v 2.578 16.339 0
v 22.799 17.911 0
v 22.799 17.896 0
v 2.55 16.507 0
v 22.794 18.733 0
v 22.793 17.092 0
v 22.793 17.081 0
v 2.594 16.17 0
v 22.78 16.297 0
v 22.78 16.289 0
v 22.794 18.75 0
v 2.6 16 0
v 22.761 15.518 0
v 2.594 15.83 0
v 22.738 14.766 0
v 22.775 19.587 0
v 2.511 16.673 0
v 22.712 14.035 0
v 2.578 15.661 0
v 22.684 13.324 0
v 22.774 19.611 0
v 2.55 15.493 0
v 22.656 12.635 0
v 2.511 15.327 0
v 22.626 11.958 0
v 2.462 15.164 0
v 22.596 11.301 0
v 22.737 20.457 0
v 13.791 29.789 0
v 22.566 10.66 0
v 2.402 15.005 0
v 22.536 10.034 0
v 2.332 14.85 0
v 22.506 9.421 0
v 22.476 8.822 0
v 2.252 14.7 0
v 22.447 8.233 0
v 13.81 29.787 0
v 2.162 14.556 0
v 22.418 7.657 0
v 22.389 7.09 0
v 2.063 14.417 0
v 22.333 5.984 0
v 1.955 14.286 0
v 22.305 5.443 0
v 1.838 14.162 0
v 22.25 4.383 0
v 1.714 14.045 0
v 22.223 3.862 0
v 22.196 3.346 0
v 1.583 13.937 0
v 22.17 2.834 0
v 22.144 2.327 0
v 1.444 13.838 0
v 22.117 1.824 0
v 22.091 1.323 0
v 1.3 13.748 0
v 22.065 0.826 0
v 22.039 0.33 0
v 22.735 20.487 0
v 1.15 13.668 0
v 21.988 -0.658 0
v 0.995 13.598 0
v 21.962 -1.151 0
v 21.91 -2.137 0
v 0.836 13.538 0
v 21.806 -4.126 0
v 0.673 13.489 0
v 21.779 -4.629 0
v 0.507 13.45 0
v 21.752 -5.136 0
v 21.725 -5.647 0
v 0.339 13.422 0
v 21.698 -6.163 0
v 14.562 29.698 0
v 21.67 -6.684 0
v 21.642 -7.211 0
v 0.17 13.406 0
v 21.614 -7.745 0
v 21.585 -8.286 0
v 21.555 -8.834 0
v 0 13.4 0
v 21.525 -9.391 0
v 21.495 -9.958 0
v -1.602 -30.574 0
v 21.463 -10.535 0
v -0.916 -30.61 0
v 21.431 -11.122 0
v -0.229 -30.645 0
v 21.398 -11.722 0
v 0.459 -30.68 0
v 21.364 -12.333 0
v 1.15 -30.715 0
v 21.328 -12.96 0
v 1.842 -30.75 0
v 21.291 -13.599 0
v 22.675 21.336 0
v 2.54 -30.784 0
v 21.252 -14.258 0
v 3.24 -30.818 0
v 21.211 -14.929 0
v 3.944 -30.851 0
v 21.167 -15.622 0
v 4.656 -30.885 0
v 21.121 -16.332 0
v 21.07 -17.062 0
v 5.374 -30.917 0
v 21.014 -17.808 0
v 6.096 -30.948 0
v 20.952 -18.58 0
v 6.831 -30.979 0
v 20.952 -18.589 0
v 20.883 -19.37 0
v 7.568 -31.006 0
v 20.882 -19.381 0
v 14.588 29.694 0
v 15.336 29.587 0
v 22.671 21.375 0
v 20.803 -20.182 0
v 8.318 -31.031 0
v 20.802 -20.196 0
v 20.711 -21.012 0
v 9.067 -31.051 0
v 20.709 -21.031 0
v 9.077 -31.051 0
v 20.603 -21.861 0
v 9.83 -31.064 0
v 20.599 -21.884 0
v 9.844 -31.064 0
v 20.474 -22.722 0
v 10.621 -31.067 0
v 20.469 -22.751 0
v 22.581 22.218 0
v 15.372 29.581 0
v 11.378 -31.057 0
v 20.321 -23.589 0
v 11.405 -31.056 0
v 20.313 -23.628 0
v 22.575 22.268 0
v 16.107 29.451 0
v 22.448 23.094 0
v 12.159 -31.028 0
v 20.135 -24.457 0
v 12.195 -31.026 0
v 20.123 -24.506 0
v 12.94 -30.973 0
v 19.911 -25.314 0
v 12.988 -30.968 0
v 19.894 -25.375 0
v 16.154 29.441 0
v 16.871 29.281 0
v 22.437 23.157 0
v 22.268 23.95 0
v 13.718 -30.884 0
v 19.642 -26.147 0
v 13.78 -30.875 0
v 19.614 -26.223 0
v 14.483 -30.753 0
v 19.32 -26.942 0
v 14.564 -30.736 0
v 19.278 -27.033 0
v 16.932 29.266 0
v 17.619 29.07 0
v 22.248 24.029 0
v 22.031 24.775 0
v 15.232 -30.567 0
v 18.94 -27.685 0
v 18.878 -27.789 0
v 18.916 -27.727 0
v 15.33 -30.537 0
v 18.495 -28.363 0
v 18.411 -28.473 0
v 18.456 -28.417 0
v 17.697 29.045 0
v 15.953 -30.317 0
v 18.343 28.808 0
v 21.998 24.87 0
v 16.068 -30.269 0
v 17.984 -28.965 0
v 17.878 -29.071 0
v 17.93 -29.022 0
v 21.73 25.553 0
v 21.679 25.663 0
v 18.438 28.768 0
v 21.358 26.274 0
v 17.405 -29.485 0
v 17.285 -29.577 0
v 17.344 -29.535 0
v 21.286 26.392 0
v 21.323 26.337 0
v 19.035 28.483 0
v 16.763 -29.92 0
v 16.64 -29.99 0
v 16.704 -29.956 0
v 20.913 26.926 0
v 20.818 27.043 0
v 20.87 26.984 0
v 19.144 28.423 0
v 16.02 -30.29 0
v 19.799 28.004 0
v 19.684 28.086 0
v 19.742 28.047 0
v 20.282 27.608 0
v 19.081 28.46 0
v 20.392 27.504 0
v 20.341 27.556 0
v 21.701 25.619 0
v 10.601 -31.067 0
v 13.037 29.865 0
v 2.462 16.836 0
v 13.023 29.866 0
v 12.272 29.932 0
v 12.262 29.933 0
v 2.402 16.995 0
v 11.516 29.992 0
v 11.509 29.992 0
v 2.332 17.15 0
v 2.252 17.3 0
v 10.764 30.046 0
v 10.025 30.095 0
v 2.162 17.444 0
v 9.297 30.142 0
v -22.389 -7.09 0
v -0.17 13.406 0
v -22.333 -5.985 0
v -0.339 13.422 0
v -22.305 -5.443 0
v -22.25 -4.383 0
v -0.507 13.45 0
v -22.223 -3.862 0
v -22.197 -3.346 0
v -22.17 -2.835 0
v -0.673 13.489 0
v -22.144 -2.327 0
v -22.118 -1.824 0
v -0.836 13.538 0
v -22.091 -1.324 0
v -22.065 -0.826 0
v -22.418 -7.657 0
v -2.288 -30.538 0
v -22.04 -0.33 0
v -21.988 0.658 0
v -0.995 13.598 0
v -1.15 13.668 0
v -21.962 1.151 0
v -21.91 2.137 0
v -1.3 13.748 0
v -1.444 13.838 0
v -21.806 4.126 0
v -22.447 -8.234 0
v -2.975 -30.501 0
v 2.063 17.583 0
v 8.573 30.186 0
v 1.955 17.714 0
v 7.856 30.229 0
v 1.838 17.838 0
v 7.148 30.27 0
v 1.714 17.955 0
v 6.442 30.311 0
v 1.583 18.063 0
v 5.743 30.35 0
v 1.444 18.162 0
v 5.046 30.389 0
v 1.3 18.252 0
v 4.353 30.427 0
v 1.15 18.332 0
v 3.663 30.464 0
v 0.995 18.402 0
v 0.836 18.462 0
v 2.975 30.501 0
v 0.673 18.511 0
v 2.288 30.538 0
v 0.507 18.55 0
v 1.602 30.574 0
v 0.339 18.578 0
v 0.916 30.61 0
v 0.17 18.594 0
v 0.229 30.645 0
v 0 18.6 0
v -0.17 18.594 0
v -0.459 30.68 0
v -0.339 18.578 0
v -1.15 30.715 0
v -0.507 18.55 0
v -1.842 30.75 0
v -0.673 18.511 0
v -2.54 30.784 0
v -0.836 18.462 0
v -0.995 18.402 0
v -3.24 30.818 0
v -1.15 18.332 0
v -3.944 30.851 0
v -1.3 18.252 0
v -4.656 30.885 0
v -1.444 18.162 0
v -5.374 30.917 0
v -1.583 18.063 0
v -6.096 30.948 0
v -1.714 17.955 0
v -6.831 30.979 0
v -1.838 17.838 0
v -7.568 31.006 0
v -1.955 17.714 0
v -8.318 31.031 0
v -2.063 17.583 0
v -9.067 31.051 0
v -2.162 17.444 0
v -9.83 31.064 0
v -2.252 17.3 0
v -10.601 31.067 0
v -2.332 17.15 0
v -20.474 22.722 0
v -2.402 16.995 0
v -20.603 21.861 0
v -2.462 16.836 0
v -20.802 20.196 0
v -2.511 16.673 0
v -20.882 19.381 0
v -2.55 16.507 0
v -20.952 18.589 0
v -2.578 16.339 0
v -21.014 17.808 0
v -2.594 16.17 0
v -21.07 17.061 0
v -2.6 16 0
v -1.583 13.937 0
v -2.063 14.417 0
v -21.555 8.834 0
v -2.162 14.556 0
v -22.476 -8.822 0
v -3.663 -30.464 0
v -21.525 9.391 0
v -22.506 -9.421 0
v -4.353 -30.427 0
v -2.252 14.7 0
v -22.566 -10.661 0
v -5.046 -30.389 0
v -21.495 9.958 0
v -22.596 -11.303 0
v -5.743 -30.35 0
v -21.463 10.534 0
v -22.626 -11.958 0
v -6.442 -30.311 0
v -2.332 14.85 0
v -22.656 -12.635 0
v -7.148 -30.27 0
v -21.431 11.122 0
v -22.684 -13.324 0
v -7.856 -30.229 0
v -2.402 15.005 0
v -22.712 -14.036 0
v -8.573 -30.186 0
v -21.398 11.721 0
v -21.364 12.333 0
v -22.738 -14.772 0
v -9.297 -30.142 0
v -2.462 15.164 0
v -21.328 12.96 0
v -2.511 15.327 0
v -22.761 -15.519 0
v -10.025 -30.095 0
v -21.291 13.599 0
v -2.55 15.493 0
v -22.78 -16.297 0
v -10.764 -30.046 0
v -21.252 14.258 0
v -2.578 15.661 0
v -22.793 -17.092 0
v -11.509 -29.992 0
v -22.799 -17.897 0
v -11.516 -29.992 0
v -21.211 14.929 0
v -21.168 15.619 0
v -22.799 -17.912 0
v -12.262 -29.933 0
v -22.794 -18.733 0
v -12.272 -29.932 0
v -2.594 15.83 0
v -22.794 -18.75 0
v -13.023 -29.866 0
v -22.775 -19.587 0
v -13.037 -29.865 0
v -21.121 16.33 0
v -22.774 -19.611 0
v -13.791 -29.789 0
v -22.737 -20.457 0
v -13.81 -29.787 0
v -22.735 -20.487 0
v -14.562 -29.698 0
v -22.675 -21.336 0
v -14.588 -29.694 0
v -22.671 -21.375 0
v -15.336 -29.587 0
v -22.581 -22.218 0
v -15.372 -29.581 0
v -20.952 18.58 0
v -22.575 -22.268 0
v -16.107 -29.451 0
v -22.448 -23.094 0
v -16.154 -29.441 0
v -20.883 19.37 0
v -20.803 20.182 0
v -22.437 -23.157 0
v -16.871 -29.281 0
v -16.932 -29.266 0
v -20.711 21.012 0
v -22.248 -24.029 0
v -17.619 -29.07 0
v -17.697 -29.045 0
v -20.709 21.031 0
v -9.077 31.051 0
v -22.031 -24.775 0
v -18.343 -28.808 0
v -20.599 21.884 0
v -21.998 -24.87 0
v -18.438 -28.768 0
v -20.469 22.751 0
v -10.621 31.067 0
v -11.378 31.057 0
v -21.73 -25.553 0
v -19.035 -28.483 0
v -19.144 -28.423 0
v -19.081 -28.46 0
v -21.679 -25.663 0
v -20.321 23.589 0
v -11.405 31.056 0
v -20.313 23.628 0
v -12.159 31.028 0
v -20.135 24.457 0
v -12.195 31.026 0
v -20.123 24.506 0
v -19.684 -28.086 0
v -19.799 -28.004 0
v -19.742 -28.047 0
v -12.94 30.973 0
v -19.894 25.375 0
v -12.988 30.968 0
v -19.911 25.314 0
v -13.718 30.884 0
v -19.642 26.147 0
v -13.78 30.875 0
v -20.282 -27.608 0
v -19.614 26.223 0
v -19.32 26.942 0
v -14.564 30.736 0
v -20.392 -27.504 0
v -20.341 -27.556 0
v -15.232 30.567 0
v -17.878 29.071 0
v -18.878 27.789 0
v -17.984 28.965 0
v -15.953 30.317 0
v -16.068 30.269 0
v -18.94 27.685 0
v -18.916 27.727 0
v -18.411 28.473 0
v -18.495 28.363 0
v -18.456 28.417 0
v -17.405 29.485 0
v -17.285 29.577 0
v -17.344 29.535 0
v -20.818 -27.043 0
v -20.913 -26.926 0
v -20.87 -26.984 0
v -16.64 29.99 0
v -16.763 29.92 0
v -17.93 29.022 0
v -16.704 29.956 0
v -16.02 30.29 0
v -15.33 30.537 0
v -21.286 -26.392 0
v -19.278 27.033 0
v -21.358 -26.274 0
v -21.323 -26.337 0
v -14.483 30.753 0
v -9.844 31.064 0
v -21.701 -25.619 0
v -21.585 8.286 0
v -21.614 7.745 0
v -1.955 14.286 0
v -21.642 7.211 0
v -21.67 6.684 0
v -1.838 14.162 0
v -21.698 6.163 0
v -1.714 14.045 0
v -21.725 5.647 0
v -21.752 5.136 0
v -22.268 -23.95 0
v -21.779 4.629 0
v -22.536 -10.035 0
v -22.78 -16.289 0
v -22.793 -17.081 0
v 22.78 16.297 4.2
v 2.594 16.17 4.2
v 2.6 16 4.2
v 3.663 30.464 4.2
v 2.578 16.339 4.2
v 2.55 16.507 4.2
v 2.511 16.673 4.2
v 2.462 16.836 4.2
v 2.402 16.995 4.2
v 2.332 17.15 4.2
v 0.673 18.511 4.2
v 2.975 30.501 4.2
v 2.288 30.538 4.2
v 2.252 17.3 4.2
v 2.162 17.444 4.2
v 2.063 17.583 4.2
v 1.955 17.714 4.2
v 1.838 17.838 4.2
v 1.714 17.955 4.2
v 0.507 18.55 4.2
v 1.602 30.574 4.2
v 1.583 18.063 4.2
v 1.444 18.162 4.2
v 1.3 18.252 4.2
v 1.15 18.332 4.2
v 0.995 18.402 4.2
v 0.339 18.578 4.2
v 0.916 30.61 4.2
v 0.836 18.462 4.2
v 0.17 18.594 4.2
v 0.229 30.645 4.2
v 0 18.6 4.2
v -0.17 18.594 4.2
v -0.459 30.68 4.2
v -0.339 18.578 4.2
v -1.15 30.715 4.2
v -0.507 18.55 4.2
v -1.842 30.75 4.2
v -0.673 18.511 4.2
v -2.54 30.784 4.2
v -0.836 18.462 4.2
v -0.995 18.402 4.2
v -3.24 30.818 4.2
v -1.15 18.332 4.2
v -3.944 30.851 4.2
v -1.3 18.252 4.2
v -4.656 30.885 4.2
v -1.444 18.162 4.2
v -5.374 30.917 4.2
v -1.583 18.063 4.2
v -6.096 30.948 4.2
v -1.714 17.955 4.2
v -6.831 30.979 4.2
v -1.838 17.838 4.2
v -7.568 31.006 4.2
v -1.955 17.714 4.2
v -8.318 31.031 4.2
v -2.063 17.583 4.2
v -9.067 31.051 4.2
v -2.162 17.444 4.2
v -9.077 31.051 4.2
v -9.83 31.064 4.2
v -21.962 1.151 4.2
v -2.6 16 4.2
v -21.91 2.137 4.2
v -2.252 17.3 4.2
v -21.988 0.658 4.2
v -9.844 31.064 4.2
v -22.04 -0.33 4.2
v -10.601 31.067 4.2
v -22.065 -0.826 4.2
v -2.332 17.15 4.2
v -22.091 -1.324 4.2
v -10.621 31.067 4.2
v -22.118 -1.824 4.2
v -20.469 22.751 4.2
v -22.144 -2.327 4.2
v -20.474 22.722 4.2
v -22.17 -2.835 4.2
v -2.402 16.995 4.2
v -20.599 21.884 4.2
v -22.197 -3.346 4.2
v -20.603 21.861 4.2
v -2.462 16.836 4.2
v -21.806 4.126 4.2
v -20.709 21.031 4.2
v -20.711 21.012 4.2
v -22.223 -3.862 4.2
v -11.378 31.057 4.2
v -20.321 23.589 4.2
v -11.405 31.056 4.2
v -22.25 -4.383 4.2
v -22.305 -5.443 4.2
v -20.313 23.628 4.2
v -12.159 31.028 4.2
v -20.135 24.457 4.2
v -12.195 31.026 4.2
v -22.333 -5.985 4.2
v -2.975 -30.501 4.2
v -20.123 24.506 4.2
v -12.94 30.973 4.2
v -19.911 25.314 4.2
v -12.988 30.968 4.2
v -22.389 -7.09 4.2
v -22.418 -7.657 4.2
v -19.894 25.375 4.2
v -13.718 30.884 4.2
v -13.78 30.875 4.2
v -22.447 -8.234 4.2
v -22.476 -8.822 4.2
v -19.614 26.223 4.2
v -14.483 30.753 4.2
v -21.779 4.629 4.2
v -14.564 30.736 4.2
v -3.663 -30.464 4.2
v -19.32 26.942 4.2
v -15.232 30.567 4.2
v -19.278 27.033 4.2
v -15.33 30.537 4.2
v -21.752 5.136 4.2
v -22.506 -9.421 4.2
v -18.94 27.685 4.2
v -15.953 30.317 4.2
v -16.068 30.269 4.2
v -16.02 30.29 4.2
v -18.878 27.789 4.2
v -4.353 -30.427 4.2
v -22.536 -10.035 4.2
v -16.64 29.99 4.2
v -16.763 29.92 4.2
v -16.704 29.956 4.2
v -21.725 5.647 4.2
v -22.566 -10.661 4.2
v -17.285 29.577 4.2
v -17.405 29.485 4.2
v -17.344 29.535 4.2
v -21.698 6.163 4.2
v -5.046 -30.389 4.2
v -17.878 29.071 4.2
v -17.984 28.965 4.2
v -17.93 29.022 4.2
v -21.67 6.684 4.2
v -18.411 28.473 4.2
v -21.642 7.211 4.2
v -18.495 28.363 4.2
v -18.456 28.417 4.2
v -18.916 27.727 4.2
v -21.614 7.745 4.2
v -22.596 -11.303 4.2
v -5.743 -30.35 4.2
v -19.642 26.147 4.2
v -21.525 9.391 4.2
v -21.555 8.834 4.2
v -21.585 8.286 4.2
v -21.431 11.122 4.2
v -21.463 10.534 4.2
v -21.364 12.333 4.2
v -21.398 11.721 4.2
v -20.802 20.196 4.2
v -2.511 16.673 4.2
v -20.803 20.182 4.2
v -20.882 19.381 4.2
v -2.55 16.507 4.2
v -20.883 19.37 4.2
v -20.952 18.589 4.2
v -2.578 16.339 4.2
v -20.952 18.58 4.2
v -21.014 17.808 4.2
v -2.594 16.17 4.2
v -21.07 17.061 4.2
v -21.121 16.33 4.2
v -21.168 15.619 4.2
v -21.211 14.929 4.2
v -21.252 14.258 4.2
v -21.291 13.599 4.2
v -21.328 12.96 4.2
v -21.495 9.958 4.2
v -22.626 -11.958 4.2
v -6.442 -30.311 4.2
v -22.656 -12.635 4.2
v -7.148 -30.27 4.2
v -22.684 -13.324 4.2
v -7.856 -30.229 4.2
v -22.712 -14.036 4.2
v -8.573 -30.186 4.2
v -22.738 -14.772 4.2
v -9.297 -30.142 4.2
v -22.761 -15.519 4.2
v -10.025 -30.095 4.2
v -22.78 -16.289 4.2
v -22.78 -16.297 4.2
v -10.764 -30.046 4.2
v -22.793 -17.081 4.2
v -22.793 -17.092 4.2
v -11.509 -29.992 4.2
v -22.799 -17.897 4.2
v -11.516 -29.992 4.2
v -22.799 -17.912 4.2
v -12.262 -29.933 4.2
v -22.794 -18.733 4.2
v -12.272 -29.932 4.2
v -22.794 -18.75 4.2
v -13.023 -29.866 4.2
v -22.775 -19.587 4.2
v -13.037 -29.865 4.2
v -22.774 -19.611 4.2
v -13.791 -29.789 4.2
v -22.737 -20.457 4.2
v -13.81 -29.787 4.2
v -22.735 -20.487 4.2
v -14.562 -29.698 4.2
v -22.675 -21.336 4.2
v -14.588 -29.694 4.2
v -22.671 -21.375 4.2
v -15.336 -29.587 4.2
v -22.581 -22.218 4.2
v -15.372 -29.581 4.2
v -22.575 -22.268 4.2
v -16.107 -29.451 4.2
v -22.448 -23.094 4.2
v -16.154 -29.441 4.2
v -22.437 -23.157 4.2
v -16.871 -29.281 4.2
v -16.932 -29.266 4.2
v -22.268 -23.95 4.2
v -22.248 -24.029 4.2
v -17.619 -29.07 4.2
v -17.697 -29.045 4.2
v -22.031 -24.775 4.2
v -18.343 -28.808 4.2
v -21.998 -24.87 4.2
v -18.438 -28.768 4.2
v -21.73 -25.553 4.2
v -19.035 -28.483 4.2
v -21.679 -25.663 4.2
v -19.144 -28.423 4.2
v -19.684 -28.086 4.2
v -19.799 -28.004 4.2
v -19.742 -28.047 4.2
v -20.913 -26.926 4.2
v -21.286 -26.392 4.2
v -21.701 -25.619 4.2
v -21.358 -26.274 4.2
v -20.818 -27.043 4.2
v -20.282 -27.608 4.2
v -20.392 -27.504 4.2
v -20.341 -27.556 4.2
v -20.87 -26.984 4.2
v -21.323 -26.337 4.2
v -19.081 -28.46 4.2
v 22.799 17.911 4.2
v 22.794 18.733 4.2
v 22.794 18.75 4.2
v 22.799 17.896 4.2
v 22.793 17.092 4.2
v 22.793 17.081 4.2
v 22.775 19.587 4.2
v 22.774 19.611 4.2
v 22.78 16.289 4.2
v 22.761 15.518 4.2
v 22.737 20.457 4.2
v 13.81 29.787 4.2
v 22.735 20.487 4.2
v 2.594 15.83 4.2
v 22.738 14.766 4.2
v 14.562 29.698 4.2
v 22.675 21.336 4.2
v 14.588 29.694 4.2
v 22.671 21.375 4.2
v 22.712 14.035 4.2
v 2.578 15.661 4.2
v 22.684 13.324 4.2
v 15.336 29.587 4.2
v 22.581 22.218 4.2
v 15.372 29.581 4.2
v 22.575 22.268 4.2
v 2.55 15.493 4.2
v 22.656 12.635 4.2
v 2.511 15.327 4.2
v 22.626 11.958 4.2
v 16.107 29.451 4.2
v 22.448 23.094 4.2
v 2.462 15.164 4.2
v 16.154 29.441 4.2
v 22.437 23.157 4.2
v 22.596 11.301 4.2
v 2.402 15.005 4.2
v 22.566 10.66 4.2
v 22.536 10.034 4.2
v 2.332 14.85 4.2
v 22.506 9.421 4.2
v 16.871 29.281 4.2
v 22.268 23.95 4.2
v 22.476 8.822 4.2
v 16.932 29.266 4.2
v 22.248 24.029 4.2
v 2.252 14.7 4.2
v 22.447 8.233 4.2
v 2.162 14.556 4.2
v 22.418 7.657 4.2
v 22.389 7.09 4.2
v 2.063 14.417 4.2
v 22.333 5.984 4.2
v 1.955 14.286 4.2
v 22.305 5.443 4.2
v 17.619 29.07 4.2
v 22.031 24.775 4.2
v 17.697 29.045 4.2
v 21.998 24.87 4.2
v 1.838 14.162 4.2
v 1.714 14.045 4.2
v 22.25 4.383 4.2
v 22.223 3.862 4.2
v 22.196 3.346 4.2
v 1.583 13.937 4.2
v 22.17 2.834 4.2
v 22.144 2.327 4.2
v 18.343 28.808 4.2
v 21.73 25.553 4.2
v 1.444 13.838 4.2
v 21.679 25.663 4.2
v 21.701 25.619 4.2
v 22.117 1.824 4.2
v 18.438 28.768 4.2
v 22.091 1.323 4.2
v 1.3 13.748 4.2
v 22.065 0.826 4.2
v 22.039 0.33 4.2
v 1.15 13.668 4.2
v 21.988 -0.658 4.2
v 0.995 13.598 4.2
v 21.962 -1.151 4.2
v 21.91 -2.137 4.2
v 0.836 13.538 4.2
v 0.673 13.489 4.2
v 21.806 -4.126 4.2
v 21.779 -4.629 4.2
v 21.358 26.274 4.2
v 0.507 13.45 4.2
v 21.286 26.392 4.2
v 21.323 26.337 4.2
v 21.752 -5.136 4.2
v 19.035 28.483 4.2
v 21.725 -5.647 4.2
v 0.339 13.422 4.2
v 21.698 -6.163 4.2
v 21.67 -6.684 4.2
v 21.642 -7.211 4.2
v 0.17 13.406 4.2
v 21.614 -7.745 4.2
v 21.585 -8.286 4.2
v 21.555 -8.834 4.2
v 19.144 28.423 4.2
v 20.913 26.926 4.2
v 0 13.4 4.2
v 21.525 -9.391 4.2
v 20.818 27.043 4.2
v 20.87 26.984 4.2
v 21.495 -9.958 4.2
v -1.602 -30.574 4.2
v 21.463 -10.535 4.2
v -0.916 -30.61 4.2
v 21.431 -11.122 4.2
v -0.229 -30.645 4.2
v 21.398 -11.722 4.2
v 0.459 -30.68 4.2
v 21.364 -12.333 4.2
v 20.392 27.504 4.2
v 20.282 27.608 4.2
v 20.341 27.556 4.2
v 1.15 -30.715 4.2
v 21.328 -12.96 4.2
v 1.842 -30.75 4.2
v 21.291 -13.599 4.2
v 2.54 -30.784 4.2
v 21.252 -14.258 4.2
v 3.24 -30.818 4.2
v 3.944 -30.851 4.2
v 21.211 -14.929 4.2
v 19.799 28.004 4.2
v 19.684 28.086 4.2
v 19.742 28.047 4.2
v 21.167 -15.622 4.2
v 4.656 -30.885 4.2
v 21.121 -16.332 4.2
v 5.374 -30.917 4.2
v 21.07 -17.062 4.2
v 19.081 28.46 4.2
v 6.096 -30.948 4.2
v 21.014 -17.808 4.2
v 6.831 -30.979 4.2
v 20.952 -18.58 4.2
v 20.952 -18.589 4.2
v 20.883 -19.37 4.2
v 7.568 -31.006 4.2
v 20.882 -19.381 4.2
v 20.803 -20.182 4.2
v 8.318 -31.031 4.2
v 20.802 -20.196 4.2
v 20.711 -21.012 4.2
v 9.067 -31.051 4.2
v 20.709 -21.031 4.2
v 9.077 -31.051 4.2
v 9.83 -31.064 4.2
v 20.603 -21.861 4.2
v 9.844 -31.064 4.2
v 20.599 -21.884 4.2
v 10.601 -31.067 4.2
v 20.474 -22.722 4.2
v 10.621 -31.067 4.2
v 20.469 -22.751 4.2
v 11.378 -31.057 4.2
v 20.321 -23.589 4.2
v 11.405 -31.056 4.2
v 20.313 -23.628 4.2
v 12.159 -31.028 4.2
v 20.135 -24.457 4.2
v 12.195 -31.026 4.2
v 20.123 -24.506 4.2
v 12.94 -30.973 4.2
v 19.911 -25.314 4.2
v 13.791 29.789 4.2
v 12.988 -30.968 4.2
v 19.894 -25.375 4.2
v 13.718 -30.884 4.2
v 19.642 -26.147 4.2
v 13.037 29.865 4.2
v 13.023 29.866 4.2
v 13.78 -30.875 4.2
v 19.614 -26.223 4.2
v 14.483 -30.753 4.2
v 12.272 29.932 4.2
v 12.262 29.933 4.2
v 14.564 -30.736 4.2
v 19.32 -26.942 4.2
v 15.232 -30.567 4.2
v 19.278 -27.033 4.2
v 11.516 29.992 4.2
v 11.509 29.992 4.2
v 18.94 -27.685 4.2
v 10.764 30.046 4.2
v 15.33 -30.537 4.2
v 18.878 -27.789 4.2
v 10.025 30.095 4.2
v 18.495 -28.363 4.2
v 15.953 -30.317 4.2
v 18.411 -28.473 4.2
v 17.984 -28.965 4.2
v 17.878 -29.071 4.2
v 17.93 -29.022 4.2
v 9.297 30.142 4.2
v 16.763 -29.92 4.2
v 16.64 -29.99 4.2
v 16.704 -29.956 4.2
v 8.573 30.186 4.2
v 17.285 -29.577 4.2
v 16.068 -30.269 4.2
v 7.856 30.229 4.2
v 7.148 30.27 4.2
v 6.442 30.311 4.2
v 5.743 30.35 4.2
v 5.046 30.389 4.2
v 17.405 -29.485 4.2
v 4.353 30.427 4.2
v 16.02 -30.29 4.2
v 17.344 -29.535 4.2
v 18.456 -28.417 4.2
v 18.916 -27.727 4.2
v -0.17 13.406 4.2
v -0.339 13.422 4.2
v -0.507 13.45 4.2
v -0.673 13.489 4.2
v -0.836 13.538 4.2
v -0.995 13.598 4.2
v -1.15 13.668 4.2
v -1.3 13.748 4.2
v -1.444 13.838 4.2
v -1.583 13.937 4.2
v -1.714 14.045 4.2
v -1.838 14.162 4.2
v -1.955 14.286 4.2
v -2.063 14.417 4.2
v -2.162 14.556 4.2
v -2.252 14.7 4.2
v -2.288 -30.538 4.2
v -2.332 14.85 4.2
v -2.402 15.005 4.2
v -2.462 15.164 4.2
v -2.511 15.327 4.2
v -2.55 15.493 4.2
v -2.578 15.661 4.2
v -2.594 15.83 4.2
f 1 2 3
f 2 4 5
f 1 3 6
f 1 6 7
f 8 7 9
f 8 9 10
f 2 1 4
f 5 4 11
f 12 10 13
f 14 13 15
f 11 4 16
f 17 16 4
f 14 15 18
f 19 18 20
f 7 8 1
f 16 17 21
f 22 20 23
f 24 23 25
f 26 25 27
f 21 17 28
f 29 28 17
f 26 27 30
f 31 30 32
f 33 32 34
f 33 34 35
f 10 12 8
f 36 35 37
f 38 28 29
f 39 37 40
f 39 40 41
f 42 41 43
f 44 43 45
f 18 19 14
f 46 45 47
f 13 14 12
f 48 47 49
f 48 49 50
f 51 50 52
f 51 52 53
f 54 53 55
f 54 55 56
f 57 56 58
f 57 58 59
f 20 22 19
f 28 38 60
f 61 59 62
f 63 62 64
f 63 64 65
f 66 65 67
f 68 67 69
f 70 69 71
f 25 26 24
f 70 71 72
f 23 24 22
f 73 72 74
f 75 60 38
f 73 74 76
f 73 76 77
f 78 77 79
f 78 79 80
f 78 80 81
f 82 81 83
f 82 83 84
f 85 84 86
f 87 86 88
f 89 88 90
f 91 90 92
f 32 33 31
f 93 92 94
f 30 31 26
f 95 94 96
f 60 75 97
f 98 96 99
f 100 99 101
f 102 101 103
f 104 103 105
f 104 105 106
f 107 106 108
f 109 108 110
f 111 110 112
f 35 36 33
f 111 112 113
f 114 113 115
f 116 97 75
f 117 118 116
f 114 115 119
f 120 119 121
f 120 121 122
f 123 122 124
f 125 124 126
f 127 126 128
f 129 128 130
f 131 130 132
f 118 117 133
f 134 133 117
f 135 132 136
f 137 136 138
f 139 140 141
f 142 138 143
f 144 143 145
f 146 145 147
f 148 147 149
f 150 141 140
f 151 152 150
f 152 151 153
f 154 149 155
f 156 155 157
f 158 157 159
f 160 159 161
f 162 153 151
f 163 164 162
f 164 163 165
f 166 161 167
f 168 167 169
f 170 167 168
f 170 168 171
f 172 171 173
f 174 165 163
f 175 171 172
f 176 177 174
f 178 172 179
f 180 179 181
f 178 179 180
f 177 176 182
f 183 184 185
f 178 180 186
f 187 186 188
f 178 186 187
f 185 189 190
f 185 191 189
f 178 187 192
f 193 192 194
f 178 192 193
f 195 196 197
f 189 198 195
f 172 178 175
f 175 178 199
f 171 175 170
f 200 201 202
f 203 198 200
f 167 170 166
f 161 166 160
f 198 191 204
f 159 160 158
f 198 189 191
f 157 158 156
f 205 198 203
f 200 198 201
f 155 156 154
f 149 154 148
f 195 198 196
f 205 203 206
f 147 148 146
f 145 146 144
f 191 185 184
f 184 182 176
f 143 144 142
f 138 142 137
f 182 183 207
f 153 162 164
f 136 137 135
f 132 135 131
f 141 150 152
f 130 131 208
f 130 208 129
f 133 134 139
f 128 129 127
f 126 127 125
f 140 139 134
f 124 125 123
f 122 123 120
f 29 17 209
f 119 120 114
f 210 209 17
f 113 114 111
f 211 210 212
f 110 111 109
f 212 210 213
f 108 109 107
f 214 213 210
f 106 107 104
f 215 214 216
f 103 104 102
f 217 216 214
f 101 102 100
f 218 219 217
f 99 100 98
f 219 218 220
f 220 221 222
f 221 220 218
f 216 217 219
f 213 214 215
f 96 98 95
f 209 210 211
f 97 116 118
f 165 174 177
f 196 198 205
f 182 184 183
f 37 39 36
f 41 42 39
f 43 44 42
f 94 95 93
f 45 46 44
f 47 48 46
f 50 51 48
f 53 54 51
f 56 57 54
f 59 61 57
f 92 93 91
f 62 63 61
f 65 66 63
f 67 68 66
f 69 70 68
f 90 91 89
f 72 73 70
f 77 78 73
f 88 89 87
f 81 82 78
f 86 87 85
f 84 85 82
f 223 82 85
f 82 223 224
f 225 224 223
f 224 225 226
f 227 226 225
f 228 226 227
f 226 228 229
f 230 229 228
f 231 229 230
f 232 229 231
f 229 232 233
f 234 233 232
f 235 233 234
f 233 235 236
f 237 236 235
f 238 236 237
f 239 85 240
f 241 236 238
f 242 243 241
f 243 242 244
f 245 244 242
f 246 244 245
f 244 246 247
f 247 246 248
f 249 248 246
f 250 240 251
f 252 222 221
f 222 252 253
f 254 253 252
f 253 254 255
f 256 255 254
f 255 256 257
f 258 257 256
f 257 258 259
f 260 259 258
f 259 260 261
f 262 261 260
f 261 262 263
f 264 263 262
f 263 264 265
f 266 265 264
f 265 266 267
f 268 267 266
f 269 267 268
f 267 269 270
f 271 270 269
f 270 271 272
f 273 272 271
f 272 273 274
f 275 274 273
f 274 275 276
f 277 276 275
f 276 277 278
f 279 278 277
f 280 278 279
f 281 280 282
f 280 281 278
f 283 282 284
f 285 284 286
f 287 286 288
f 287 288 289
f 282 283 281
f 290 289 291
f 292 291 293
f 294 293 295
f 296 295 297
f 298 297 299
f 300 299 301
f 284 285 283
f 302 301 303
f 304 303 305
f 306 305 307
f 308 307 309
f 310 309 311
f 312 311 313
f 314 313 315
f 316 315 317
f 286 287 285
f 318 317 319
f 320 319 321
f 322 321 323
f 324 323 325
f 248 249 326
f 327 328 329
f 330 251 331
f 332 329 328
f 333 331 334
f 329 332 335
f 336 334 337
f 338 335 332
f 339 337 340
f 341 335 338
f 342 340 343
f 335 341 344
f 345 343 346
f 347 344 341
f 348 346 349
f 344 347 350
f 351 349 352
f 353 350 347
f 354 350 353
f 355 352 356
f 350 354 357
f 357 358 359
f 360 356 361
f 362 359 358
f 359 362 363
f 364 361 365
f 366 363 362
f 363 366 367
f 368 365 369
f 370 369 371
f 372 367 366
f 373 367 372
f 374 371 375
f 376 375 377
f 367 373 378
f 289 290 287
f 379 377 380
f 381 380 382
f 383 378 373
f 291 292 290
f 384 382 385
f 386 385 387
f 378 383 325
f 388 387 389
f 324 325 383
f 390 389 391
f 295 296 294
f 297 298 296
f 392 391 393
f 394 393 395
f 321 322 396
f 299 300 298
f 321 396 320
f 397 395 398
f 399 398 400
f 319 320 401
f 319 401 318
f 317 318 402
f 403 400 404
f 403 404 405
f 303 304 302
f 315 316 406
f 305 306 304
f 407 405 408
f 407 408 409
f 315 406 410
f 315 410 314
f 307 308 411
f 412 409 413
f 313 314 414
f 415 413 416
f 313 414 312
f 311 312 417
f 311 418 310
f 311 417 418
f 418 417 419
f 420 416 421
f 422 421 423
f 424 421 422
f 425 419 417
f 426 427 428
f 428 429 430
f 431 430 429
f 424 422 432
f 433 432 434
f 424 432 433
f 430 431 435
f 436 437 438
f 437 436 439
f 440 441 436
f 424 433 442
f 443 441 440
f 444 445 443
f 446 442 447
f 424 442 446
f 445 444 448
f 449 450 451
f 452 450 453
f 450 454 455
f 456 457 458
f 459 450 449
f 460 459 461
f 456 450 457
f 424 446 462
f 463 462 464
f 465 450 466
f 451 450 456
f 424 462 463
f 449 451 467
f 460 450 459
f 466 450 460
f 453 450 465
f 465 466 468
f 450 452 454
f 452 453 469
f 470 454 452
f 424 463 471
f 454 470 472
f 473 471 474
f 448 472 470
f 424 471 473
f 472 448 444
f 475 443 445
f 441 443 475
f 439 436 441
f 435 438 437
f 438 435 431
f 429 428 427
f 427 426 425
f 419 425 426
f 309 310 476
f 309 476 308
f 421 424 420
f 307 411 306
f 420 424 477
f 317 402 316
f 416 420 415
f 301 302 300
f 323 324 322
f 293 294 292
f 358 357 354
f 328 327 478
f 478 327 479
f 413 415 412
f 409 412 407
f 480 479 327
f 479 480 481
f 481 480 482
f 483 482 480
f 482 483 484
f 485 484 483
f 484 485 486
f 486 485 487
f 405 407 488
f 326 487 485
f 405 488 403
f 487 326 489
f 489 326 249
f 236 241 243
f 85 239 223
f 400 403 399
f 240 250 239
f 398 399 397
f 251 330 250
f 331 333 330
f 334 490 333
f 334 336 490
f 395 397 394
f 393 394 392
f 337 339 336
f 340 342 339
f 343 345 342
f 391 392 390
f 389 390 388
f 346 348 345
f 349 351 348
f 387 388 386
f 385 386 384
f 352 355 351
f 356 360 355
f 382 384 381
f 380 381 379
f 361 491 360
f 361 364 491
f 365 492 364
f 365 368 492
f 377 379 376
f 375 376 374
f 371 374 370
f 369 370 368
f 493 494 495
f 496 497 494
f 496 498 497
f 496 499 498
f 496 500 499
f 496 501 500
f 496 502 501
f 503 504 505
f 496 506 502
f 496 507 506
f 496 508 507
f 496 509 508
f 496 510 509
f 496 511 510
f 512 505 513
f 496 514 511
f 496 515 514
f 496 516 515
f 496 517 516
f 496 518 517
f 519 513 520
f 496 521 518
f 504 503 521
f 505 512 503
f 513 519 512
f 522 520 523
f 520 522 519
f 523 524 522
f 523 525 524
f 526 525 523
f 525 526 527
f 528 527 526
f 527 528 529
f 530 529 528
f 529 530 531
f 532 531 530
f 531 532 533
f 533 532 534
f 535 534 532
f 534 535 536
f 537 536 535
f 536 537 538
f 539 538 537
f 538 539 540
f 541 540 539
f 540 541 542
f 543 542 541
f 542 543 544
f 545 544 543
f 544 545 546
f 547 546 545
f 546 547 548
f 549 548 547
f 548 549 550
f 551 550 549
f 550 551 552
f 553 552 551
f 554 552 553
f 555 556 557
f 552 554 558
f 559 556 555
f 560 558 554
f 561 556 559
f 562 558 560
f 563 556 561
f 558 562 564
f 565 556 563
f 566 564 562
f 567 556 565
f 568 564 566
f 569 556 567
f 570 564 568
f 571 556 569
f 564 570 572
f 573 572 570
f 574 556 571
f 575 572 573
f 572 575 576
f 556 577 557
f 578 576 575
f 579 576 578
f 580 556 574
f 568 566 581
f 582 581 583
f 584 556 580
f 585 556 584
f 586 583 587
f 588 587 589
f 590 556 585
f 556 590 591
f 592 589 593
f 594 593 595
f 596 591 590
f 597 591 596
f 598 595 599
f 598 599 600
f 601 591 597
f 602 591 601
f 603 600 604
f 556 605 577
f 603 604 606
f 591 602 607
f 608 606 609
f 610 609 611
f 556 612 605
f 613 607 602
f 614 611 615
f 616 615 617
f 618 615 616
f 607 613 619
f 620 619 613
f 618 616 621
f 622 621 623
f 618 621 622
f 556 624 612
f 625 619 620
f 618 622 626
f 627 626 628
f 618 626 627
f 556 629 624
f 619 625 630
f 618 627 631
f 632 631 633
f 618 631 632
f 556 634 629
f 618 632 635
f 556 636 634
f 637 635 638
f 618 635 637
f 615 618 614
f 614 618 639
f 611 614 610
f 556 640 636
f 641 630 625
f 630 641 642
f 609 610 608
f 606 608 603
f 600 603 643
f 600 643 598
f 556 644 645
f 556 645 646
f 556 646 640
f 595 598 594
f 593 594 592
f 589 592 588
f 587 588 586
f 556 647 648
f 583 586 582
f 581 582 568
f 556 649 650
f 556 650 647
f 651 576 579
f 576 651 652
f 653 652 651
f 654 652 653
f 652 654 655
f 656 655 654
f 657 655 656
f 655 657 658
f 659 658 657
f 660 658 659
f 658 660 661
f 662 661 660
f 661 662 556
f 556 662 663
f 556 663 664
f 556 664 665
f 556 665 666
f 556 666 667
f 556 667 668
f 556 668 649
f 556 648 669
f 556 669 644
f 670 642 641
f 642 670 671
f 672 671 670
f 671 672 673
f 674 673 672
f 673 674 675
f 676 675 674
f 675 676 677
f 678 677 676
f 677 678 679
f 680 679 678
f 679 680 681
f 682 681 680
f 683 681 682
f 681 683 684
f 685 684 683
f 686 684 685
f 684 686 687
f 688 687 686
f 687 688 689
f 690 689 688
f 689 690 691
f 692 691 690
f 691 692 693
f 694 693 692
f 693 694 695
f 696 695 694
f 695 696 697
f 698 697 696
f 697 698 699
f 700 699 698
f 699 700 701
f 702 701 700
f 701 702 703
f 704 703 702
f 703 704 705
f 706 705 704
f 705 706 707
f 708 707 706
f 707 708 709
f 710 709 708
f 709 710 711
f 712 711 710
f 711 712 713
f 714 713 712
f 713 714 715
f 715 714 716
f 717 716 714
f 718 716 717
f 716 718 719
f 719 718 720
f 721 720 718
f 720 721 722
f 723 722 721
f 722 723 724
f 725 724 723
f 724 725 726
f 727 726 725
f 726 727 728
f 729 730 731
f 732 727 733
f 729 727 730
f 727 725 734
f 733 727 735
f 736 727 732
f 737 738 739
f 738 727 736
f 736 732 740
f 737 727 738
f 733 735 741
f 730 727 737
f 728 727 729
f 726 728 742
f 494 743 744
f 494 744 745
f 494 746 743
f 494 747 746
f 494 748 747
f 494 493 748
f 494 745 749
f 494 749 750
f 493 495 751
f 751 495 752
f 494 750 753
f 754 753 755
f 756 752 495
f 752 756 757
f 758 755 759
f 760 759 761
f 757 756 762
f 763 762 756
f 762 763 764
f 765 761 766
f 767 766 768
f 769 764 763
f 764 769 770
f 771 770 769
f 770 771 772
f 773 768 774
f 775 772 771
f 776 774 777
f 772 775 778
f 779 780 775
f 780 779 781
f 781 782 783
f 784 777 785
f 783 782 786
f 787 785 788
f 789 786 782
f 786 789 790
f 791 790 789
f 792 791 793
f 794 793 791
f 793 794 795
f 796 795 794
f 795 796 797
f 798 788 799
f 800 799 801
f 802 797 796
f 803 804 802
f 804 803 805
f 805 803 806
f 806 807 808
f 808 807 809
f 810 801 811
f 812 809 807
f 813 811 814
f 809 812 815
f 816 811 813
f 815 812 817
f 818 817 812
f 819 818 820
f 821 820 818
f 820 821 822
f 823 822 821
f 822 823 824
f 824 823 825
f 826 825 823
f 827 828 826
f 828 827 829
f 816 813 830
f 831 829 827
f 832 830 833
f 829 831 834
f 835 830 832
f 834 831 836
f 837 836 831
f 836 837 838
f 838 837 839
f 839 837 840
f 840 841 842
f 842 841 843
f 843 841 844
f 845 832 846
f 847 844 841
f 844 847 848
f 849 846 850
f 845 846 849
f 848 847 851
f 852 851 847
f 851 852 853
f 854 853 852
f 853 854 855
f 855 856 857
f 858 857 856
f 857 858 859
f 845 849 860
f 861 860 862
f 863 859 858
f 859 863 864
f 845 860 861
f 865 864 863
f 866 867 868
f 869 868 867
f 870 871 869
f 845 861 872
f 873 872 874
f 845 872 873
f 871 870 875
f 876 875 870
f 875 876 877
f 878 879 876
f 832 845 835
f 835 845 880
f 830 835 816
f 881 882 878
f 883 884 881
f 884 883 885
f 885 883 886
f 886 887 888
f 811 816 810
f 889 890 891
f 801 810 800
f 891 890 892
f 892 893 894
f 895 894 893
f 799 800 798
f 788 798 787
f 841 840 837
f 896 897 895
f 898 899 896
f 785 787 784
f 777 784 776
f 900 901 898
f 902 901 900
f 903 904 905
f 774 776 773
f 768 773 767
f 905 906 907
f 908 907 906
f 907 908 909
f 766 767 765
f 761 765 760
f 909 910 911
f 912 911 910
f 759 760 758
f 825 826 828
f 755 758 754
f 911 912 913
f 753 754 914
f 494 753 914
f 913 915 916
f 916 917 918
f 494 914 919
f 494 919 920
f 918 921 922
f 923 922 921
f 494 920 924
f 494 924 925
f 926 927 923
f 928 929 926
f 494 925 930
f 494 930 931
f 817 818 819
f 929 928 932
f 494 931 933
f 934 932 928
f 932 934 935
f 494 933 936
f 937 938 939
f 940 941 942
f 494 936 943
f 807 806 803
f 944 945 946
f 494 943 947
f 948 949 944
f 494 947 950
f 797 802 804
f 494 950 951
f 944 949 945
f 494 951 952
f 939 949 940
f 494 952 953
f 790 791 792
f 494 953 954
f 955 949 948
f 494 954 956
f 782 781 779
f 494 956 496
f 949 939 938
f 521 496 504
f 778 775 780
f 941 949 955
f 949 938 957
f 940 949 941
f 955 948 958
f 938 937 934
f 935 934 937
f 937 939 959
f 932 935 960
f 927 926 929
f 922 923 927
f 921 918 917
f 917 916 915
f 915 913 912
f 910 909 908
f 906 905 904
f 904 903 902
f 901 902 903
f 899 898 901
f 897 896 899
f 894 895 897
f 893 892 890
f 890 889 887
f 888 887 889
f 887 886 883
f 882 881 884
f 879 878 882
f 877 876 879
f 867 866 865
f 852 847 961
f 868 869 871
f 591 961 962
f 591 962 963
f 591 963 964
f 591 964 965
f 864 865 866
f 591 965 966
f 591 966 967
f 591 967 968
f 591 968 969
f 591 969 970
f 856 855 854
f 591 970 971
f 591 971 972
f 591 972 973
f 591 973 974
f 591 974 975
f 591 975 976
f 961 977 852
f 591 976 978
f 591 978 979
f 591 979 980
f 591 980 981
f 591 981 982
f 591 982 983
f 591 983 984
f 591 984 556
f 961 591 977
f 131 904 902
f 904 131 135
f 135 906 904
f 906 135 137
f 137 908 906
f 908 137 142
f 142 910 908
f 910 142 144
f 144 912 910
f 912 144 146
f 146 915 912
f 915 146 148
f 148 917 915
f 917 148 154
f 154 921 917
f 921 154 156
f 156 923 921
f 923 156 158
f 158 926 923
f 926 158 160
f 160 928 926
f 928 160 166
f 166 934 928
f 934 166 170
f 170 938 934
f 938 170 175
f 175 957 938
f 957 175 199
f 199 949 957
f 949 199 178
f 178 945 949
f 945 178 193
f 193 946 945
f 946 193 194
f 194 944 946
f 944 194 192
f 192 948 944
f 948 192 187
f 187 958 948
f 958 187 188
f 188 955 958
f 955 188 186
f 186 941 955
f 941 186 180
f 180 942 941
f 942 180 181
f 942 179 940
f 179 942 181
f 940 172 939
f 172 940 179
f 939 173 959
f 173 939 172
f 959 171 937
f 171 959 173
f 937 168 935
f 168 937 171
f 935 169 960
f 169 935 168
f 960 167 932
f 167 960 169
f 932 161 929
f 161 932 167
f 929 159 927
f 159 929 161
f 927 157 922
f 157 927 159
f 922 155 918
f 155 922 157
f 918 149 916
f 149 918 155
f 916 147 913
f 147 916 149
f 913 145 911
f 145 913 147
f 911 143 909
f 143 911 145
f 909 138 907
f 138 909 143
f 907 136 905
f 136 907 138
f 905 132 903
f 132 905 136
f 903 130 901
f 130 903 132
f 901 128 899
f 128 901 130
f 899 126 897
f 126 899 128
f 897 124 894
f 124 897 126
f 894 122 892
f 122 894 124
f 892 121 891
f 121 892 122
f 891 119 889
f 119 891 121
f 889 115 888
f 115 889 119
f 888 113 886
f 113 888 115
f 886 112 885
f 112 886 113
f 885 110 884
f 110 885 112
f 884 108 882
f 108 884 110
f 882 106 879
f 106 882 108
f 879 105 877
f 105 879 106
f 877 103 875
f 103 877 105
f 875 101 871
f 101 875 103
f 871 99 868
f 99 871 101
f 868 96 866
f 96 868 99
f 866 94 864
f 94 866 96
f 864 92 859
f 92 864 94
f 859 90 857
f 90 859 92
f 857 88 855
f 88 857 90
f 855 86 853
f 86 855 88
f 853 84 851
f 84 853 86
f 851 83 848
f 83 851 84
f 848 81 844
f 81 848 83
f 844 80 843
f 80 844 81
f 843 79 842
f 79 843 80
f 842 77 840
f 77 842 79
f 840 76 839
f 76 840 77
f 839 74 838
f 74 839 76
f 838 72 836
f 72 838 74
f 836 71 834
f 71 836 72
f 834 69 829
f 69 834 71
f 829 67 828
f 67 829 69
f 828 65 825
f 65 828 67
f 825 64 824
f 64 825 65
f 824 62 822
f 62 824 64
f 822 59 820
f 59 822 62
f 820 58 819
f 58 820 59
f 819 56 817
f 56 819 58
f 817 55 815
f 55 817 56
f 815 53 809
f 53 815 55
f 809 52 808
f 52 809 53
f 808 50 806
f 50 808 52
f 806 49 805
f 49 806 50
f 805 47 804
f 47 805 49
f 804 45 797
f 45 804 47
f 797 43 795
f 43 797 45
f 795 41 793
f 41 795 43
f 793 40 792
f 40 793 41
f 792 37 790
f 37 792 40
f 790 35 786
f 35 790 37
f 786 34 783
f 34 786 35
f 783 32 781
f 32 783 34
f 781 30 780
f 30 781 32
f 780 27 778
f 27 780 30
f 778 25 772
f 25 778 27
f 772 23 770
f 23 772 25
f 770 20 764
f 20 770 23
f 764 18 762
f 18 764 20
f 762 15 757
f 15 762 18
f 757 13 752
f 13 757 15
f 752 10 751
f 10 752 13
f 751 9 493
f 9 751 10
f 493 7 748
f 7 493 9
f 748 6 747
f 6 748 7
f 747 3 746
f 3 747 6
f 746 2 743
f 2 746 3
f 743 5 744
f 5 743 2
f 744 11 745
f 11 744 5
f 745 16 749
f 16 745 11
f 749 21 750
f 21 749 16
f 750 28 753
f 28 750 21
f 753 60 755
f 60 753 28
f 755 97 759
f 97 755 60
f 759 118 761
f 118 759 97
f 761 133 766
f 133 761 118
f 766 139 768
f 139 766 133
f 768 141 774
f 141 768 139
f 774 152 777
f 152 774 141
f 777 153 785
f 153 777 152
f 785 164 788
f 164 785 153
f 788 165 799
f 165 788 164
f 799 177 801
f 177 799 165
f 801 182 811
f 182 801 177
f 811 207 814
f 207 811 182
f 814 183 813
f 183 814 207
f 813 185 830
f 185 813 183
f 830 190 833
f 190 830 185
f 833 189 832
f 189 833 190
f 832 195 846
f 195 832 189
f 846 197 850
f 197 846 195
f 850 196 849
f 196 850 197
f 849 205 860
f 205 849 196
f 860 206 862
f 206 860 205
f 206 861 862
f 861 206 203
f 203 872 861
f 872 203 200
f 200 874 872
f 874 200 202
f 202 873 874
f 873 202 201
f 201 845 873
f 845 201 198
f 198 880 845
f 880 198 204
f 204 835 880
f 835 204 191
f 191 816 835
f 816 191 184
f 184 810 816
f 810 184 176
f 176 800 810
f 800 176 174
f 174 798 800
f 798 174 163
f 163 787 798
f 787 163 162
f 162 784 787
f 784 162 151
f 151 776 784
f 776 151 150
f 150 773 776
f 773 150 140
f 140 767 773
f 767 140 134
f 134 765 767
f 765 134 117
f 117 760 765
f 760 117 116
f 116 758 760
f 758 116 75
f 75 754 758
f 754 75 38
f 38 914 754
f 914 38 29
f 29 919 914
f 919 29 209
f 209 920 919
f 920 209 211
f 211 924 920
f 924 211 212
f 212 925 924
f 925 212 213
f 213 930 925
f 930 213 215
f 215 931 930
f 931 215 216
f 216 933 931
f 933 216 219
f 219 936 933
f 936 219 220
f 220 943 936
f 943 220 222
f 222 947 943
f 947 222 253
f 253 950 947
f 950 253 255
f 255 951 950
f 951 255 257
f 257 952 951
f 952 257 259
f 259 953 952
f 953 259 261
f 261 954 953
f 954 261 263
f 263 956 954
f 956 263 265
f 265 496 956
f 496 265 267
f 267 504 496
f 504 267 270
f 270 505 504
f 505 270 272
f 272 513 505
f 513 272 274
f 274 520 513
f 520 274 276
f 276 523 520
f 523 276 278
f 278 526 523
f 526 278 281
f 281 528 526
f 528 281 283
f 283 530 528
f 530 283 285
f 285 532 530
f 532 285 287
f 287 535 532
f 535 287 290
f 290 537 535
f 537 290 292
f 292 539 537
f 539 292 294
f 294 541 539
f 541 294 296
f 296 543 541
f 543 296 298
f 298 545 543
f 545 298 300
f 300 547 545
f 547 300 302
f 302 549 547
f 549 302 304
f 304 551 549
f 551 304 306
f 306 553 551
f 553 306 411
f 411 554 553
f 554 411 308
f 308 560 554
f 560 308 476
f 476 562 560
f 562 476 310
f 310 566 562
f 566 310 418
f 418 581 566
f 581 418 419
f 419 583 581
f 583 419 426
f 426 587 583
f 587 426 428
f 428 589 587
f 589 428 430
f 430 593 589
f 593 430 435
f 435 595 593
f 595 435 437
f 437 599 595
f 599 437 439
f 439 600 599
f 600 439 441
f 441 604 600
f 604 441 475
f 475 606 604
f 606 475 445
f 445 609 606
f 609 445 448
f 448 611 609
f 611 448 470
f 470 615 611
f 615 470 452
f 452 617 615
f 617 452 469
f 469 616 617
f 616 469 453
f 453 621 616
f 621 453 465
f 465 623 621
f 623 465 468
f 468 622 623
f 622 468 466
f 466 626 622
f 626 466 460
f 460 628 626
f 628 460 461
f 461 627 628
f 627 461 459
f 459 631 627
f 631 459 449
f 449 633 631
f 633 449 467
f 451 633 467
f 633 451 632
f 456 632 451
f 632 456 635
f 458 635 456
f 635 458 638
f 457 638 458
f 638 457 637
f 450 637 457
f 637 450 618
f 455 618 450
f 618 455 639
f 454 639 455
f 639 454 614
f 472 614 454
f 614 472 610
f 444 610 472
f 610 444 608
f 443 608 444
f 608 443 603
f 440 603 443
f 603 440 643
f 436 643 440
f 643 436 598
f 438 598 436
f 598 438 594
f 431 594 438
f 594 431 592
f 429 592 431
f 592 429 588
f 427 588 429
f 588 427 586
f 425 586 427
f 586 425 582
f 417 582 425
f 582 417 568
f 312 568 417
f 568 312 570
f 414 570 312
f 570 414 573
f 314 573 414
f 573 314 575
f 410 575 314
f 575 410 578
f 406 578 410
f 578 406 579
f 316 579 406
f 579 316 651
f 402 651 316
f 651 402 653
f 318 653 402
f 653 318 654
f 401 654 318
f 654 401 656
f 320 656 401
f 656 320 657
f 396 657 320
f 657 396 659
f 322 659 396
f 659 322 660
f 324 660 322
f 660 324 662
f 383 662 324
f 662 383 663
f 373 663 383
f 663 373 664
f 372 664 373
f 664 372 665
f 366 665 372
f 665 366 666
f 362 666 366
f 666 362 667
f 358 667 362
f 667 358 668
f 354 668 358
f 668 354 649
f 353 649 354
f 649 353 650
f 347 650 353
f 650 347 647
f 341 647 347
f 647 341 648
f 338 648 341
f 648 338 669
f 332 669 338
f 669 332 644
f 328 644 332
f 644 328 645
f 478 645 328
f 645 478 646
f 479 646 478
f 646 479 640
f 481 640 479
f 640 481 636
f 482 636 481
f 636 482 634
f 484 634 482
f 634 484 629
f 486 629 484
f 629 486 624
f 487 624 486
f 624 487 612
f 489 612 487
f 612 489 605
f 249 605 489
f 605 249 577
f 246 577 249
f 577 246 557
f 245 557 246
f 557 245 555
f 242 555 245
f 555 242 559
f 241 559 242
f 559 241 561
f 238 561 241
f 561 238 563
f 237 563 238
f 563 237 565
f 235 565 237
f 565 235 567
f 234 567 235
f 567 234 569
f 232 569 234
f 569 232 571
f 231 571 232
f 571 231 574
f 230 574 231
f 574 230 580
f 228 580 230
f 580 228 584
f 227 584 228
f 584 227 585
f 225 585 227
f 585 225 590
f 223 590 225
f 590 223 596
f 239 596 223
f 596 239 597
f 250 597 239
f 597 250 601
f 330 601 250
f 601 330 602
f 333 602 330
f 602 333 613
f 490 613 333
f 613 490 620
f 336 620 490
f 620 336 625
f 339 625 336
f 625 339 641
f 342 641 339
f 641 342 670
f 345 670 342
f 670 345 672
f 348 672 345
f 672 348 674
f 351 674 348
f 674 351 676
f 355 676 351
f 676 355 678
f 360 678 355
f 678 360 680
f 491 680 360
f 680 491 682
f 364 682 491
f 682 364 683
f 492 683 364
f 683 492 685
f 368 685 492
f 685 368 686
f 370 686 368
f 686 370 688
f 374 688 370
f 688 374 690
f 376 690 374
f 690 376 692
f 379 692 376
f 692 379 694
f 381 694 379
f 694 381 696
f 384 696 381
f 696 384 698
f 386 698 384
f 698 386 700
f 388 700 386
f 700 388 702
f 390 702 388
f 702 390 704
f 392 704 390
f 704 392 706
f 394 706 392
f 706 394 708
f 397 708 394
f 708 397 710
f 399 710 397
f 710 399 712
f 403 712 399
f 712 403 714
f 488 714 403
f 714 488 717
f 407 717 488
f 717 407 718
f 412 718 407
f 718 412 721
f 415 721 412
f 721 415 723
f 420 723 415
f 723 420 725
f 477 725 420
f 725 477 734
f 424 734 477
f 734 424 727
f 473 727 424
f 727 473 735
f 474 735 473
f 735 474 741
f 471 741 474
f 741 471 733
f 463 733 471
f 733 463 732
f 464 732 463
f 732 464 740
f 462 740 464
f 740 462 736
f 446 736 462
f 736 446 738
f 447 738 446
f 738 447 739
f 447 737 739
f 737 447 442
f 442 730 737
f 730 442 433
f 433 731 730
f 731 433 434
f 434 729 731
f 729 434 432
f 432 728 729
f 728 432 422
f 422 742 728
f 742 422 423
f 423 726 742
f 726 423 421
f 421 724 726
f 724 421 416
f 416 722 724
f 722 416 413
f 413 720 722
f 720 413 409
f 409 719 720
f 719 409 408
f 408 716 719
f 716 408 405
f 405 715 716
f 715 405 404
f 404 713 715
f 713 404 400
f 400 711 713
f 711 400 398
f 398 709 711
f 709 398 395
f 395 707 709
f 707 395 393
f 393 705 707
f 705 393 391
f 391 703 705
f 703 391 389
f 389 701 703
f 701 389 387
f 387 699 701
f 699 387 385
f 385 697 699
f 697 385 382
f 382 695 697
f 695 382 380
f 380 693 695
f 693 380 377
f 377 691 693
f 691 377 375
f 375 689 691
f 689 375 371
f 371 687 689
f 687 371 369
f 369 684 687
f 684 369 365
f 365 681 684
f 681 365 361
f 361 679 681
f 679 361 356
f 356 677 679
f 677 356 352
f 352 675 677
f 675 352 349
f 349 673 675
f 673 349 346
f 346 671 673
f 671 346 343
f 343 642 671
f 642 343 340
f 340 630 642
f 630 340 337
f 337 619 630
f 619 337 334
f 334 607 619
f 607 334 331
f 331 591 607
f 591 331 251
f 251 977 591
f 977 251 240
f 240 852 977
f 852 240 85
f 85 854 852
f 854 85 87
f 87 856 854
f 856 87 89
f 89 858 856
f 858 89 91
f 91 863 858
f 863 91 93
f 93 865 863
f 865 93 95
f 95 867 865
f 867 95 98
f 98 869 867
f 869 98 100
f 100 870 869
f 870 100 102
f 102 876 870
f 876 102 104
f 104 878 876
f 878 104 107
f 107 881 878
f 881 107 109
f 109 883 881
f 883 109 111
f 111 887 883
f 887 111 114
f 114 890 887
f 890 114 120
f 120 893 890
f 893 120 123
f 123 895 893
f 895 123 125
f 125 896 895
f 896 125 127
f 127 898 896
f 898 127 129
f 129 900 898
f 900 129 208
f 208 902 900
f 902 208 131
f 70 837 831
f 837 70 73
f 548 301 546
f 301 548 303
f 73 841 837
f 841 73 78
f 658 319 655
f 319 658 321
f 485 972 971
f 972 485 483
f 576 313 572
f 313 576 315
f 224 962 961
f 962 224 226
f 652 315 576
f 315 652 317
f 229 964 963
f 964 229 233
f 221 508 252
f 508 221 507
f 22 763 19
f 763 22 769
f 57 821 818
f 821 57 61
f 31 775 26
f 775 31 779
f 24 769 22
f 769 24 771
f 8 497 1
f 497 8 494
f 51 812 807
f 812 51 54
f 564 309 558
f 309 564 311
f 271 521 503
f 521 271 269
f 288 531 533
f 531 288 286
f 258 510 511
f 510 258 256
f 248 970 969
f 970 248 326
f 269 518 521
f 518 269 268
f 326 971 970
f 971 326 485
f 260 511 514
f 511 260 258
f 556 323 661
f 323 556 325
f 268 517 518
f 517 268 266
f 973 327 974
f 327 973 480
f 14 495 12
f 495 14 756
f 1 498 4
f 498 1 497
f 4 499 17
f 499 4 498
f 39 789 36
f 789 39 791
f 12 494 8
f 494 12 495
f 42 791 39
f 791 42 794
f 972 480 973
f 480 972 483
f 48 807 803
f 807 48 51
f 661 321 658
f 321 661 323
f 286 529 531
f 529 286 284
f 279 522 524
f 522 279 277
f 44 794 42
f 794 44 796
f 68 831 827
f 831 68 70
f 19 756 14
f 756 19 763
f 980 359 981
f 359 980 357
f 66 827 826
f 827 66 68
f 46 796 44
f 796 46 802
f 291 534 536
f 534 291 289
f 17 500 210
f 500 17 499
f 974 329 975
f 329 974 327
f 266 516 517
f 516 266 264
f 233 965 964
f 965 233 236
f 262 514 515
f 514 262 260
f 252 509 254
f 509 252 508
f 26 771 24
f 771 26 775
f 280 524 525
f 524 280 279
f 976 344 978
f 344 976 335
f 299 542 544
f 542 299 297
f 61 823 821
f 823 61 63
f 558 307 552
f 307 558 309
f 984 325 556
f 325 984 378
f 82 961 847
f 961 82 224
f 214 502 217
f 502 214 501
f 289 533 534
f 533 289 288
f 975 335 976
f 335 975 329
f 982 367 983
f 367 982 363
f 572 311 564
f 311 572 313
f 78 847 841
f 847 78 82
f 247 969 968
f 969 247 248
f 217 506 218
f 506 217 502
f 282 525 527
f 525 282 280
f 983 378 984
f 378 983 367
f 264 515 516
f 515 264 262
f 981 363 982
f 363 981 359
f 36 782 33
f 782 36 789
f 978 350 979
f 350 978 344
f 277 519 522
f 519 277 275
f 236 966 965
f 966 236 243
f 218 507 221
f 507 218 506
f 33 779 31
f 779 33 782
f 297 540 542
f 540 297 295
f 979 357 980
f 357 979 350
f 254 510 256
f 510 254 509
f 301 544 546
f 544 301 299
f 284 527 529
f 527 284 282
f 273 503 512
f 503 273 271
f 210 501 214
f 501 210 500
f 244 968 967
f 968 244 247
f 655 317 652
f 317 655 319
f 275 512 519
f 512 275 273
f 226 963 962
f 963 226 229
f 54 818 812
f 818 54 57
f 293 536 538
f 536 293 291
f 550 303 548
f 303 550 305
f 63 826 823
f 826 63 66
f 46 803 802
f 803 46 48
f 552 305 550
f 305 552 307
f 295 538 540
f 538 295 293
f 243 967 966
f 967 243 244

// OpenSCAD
$fn=96;
thickness_mm = 4.2;
pts = [[21.9621, -1.151], [21.9879, -0.6581], [22.0137, -0.1646], [22.0395, 0.3297], [22.0653, 0.8256], [22.0913, 1.3235], [22.1175, 1.824], [22.1437, 2.3274], [22.1699, 2.8344], [22.1965, 3.3456], [22.2231, 3.8614], [22.2502, 4.3826], [22.2773, 4.9096], [22.3047, 5.4432], [22.3326, 5.984], [22.3606, 6.5327], [22.389, 7.09], [22.4177, 7.6565], [22.4468, 8.2334], [22.4762, 8.8213], [22.5059, 9.421], [22.5358, 10.0336], [22.5658, 10.66], [22.596, 11.3011], [22.6259, 11.9581], [22.6556, 12.6321], [22.6844, 13.324], [22.7121, 14.0351], [22.7379, 14.7661], [22.7607, 15.5181], [22.7798, 16.2915], [22.7932, 17.0869], [22.7988, 17.904], [22.7938, 18.7421], [22.7747, 19.5991], [22.7365, 20.472], [22.6735, 21.3557], [22.5787, 22.2433], [22.4435, 23.1254], [22.2593, 23.9899], [22.0167, 24.823], [21.7076, 25.6096], [21.3259, 26.3354], [20.8696, 26.9882], [20.3403, 27.56], [19.7442, 28.0486], [19.0909, 28.4563], [18.3917, 28.7899], [17.6582, 29.0591], [16.9016, 29.2744], [16.1309, 29.4463], [15.3537, 29.5842], [14.5754, 29.6959], [13.8001, 29.7881], [13.0303, 29.8657], [12.2676, 29.9327], [11.5128, 29.992], [10.7663, 30.0455], [10.028, 30.095], [9.2974, 30.1416], [8.5743, 30.1859], [7.8579, 30.2287], [7.1476, 30.2701], [6.4427, 30.3105], [5.7426, 30.35], [5.0464, 30.3887], [4.3536, 30.4268], [3.6635, 30.4644], [2.9753, 30.5015], [2.2885, 30.5381], [1.6023, 30.5742], [0.9162, 30.61], [0.2293, 30.6454], [-0.459, 30.6805], [-1.1493, 30.7152], [-1.8423, 30.7498], [-2.5387, 30.784], [-3.2391, 30.8179], [-3.9444, 30.8514], [-4.6551, 30.8845], [-5.372, 30.9168], [-6.0958, 30.9483], [-6.8273, 30.9784], [-7.5667, 31.0063], [-8.3148, 31.0311], [-9.0715, 31.051], [-9.8371, 31.0641], [-10.6108, 31.0674], [-11.3915, 31.0567], [-12.1772, 31.027], [-12.9646, 30.9712], [-13.749, 30.8807], [-14.524, 30.7457], [-15.2815, 30.5546], [-16.0119, 30.2959], [-16.7042, 29.9588], [-17.348, 29.5352], [-17.9342, 29.0218], [-18.4563, 28.4203], [-18.9117, 27.7384], [-19.3014, 26.9883], [-19.6298, 26.1852], [-19.9033, 25.3447], [-20.1299, 24.4816], [-20.3171, 23.6088], [-20.472, 22.7365], [-20.6012, 21.8724], [-20.7099, 21.0221], [-20.8024, 20.1891], [-20.8823, 19.3758], [-20.952, 18.5834], [-21.014, 17.8122], [-21.0698, 17.062], [-21.1206, 16.3322], [-21.1674, 15.6222], [-21.211, 14.9311], [-21.252, 14.2577], [-21.291, 13.6011], [-21.3279, 12.9604], [-21.3636, 12.3343], [-21.3978, 11.7219], [-21.431, 11.1224], [-21.4632, 10.5346], [-21.4946, 9.9579], [-21.5253, 9.3914], [-21.5553, 8.8342], [-21.5847, 8.2856], [-21.6136, 7.7449], [-21.642, 7.2113], [-21.6702, 6.6844], [-21.6978, 6.1632], [-21.7252, 5.6474], [-21.7522, 5.1363], [-21.7791, 4.6293], [-21.8057, 4.1259], [-21.832, 3.6255], [-21.8582, 3.1276], [-21.8843, 2.6316], [-21.9103, 2.1373], [-21.9362, 1.6439], [-21.9621, 1.151], [-21.9879, 0.6581], [-22.0137, 0.1646], [-22.0395, -0.3297], [-22.0653, -0.8256], [-22.0913, -1.3235], [-22.1175, -1.824], [-22.1437, -2.3274], [-22.1699, -2.8344], [-22.1965, -3.3456], [-22.2231, -3.8614], [-22.2502, -4.3826], [-22.2773, -4.9096], [-22.3047, -5.4432], [-22.3326, -5.984], [-22.3606, -6.5327], [-22.389, -7.09], [-22.4177, -7.6565], [-22.4468, -8.2334], [-22.4762, -8.8213], [-22.5059, -9.421], [-22.5358, -10.0336], [-22.5658, -10.66], [-22.596, -11.3011], [-22.6259, -11.9581], [-22.6556, -12.6321], [-22.6844, -13.324], [-22.7121, -14.0351], [-22.7379, -14.7661], [-22.7607, -15.5181], [-22.7798, -16.2915], [-22.7932, -17.0869], [-22.7988, -17.904], [-22.7938, -18.7421], [-22.7747, -19.5991], [-22.7365, -20.472], [-22.6735, -21.3557], [-22.5787, -22.2433], [-22.4435, -23.1254], [-22.2593, -23.9899], [-22.0167, -24.823], [-21.7076, -25.6096], [-21.3259, -26.3354], [-20.8696, -26.9882], [-20.3403, -27.56], [-19.7442, -28.0486], [-19.0909, -28.4563], [-18.3917, -28.7899], [-17.6582, -29.0591], [-16.9016, -29.2744], [-16.1309, -29.4463], [-15.3537, -29.5842], [-14.5754, -29.6959], [-13.8001, -29.7881], [-13.0303, -29.8657], [-12.2676, -29.9327], [-11.5128, -29.992], [-10.7663, -30.0455], [-10.028, -30.095], [-9.2974, -30.1416], [-8.5743, -30.1859], [-7.8579, -30.2287], [-7.1476, -30.2701], [-6.4427, -30.3105], [-5.7426, -30.35], [-5.0464, -30.3887], [-4.3536, -30.4268], [-3.6635, -30.4644], [-2.9753, -30.5015], [-2.2885, -30.5381], [-1.6023, -30.5742], [-0.9162, -30.61], [-0.2293, -30.6454], [0.459, -30.6805], [1.1493, -30.7152], [1.8423, -30.7498], [2.5387, -30.784], [3.2391, -30.8179], [3.9444, -30.8514], [4.6551, -30.8845], [5.372, -30.9168], [6.0958, -30.9483], [6.8273, -30.9784], [7.5667, -31.0063], [8.3148, -31.0311], [9.0715, -31.051], [9.8371, -31.0641], [10.6108, -31.0674], [11.3915, -31.0567], [12.1772, -31.027], [12.9646, -30.9712], [13.749, -30.8807], [14.524, -30.7457], [15.2815, -30.5546], [16.0119, -30.2959], [16.7042, -29.9588], [17.348, -29.5352], [17.9342, -29.0218], [18.4563, -28.4203], [18.9117, -27.7384], [19.3014, -26.9883], [19.6298, -26.1852], [19.9033, -25.3447], [20.1299, -24.4816], [20.3171, -23.6088], [20.472, -22.7365], [20.6012, -21.8724], [20.7099, -21.0221], [20.8024, -20.1891], [20.8823, -19.3758], [20.952, -18.5834], [21.014, -17.8122], [21.0698, -17.062], [21.1206, -16.3322], [21.1674, -15.6222], [21.211, -14.9311], [21.252, -14.2577], [21.291, -13.6011], [21.3279, -12.9604], [21.3636, -12.3343], [21.3978, -11.7219], [21.431, -11.1224], [21.4632, -10.5346], [21.4946, -9.9579], [21.5253, -9.3914], [21.5553, -8.8342], [21.5847, -8.2856], [21.6136, -7.7449], [21.642, -7.2113], [21.6702, -6.6844], [21.6978, -6.1632], [21.7252, -5.6474], [21.7522, -5.1363], [21.7791, -4.6293], [21.8057, -4.1259], [21.832, -3.6255], [21.8582, -3.1276], [21.8843, -2.6316], [21.9103, -2.1373], [21.9362, -1.6439]];
hole = [0.0, 16.0, 2.6];
offset_r = 1.1;
module shape2d(){
  // CGAL fix + style control
  offset(r=offset_r) offset(r=-offset_r)
    polygon(points=pts, paths=[[for(i=[0:len(pts)-1]) i]]);
}
module body(){
  linear_extrude(height=thickness_mm, convexity=10)
    shape2d();
}
difference(){
  body();
  translate([hole[0], hole[1], -1])
    cylinder(h=thickness_mm+2, r=hole[2]);
}
